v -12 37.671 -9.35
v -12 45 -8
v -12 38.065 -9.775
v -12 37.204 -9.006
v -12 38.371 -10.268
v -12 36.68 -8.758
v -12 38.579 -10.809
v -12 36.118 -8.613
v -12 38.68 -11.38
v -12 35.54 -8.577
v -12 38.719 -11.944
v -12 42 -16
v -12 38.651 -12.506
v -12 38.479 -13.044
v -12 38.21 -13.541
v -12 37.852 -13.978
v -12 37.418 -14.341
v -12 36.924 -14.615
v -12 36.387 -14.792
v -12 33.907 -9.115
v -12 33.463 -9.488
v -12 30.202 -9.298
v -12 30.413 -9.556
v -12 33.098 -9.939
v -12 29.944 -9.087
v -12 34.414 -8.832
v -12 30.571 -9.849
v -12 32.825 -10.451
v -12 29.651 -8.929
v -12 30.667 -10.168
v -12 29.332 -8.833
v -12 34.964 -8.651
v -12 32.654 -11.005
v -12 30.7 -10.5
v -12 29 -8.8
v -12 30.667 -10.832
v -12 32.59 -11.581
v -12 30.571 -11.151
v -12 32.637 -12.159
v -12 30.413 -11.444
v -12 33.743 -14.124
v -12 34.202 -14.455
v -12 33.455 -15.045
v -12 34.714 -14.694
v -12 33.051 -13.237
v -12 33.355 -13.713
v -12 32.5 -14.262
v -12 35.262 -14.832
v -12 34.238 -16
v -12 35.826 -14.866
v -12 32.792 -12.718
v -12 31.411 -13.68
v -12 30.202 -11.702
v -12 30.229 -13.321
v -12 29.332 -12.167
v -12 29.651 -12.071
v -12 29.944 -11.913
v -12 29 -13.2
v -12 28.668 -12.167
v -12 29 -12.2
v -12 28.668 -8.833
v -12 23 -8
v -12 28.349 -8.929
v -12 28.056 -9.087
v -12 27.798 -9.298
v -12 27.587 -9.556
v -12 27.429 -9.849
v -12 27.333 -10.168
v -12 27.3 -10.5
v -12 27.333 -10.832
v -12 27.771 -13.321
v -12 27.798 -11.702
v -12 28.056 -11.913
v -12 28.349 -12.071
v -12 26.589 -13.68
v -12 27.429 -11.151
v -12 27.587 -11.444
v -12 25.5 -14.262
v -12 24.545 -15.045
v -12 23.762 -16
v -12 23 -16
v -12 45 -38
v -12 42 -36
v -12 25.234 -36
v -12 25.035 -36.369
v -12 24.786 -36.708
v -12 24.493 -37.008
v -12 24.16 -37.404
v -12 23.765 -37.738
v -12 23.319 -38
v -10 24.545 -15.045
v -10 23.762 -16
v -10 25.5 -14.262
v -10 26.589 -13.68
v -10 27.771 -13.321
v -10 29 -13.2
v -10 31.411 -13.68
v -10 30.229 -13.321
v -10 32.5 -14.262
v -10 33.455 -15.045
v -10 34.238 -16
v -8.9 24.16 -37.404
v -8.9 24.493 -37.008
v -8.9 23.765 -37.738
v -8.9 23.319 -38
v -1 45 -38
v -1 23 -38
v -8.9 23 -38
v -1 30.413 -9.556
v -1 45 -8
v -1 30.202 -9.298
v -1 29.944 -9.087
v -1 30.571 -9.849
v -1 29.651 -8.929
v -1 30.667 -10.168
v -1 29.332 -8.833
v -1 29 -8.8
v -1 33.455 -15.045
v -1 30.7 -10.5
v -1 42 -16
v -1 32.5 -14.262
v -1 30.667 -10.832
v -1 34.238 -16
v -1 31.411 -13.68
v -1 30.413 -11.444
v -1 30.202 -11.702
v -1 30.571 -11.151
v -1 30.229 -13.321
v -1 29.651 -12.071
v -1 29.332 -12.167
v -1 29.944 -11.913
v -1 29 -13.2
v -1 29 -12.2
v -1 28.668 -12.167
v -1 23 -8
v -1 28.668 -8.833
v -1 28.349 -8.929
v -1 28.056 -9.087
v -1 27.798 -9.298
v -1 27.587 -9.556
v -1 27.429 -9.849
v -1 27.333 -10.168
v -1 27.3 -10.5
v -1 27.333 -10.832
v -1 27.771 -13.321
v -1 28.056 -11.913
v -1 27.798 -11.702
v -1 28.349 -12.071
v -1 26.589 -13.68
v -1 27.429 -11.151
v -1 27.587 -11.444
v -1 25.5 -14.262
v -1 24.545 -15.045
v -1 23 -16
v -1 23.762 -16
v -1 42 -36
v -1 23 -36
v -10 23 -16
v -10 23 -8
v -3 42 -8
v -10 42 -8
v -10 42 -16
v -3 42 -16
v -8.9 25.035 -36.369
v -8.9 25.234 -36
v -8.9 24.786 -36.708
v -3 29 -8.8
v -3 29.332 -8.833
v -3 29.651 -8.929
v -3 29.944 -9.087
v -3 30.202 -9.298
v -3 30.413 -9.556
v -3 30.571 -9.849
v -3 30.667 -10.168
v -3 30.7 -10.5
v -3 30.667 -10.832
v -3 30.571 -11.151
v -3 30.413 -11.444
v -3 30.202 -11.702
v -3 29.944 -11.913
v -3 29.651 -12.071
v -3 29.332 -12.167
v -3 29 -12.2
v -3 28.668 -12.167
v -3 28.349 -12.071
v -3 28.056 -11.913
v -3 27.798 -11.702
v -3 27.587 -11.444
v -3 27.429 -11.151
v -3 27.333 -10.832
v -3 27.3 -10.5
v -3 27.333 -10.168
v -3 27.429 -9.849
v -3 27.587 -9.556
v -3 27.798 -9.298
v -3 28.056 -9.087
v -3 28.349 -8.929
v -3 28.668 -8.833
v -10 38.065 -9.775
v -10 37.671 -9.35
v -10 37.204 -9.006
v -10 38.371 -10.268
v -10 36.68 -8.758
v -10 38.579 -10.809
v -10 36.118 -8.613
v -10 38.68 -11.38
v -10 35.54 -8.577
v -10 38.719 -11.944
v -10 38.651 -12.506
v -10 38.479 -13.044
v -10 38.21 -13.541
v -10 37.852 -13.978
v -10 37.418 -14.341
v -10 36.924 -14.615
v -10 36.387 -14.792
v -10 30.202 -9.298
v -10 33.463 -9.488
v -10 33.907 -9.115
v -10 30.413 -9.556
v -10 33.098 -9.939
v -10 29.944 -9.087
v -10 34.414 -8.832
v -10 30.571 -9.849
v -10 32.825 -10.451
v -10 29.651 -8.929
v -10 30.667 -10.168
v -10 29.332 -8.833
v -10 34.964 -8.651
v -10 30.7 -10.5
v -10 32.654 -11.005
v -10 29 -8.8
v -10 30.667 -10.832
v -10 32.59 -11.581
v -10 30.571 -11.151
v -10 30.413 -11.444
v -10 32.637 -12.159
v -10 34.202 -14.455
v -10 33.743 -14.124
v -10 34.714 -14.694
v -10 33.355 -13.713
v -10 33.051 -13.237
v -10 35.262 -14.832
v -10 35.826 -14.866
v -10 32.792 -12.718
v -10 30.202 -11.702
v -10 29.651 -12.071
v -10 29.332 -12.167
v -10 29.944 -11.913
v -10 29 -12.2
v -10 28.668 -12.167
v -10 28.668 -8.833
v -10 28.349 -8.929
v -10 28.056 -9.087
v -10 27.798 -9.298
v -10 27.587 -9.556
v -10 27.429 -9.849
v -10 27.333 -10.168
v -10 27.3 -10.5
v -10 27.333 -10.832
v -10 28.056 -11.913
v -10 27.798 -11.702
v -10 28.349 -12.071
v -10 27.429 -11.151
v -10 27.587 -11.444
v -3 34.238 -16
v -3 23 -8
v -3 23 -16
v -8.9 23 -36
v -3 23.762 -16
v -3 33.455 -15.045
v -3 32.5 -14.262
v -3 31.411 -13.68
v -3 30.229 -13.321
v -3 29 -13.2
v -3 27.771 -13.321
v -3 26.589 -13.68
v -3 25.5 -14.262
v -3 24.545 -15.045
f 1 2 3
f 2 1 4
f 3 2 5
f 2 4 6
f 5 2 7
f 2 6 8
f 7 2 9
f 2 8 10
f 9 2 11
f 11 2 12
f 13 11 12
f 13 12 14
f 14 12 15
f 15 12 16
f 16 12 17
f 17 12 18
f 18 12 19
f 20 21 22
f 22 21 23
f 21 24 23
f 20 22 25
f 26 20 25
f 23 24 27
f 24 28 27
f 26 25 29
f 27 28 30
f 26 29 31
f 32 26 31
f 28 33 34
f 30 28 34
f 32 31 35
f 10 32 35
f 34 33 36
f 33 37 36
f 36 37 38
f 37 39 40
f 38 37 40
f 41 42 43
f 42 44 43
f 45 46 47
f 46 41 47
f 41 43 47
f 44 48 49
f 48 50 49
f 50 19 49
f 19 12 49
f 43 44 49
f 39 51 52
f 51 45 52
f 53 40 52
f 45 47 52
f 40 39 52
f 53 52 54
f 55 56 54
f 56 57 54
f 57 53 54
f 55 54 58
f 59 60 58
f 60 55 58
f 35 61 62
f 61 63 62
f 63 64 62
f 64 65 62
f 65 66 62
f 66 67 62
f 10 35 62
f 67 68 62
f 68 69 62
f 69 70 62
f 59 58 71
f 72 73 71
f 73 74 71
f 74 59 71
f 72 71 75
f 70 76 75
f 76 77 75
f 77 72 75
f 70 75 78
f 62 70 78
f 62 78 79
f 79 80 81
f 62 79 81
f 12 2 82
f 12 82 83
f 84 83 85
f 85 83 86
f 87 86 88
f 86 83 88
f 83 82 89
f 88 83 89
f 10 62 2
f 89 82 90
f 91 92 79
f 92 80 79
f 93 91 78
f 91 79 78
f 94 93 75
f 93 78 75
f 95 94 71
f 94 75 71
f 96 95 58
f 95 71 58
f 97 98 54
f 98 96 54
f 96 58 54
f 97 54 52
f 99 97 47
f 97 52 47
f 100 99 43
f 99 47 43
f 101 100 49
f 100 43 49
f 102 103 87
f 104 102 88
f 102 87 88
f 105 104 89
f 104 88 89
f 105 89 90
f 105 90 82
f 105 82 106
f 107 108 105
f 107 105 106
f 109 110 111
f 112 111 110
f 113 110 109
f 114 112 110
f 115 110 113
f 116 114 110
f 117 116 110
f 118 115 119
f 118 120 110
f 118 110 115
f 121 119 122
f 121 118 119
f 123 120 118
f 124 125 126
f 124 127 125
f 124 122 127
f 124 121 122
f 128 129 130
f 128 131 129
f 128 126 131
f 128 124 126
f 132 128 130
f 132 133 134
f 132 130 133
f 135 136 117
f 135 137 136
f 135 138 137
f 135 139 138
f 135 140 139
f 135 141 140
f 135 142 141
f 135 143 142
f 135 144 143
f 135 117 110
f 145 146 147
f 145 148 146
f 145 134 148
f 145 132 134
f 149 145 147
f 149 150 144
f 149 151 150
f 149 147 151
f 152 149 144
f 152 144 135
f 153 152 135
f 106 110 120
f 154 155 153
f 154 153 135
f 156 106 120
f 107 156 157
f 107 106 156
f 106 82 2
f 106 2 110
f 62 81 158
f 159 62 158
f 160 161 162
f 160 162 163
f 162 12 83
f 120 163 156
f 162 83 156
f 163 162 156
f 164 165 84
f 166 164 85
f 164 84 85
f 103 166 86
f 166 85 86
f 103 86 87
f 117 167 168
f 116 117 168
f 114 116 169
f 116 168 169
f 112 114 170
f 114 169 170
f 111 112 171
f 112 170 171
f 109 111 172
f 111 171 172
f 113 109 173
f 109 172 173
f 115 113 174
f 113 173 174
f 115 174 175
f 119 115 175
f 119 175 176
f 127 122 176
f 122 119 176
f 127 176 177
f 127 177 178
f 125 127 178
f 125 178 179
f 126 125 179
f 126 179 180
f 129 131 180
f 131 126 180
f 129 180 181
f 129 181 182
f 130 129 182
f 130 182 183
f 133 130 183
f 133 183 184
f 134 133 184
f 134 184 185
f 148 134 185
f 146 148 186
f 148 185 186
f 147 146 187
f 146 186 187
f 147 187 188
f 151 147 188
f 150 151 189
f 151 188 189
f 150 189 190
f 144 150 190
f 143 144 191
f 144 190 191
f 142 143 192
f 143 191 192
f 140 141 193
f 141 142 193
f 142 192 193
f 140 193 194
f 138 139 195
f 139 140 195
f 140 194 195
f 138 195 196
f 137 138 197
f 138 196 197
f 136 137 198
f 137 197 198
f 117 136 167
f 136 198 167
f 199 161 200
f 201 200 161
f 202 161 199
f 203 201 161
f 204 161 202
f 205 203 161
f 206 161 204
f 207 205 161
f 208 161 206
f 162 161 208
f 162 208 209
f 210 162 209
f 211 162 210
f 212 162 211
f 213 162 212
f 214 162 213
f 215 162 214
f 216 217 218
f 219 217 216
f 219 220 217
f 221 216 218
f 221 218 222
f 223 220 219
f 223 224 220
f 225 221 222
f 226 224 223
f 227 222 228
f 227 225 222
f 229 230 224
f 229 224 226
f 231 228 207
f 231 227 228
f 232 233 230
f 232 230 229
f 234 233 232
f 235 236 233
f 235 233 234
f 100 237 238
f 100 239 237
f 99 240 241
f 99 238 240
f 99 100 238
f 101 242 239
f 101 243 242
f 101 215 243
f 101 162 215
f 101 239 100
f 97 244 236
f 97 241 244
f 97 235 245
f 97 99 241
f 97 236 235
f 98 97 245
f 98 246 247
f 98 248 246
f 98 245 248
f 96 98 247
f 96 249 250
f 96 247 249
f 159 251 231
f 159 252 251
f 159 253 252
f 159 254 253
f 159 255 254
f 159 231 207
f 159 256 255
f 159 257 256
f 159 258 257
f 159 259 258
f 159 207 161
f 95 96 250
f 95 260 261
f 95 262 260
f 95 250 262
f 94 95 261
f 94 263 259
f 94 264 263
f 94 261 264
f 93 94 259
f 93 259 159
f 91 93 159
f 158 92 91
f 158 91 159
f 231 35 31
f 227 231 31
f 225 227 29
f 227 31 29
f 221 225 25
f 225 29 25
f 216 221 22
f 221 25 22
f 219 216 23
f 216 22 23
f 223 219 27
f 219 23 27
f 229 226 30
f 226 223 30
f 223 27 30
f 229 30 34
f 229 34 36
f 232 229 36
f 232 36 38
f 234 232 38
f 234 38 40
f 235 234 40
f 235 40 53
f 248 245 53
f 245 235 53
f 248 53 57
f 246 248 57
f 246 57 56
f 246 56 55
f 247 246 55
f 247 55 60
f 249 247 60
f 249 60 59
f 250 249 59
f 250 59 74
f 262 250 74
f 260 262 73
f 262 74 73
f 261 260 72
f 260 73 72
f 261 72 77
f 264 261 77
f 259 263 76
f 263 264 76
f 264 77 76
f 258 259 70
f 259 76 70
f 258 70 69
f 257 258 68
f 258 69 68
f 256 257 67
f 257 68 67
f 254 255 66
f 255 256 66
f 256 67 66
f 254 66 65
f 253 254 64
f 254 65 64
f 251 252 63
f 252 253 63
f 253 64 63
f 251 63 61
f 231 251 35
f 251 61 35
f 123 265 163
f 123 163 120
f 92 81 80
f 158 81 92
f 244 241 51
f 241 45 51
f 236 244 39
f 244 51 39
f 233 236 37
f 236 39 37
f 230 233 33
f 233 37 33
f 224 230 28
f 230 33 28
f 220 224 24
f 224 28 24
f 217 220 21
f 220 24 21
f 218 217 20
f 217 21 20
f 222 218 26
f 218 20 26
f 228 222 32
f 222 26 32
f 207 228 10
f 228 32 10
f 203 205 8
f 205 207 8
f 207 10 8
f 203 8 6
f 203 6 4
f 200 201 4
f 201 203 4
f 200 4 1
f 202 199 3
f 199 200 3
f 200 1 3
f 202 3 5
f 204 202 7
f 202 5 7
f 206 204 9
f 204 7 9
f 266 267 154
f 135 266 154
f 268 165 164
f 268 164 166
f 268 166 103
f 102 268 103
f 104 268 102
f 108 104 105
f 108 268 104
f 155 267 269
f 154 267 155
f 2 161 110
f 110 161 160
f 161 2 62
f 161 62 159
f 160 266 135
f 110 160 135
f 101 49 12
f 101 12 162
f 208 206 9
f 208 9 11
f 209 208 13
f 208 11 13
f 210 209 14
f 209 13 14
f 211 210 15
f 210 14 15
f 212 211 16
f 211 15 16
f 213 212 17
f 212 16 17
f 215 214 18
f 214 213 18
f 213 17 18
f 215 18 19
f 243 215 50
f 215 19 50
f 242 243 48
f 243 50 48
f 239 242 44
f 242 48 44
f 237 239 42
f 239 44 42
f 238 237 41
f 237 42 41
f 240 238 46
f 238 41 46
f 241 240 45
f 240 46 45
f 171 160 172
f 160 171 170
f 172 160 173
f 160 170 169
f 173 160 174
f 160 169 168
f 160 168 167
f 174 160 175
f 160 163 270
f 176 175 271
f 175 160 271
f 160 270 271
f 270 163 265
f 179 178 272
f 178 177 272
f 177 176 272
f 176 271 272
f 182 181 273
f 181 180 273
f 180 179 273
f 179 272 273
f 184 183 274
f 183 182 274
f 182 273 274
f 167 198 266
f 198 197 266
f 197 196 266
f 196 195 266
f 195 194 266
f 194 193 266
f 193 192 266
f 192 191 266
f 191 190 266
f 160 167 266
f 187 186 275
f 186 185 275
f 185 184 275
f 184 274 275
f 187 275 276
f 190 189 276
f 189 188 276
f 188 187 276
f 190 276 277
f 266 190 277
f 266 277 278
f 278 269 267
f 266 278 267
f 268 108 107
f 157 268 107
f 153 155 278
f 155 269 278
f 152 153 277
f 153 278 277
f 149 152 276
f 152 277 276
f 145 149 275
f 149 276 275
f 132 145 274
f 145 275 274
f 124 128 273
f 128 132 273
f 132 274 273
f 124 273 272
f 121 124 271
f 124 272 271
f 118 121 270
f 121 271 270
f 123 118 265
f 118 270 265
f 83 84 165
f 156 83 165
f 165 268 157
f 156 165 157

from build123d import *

# Parameters (mm, degrees)
REAR_LOCK_EAR_SKETCH_W             = 2
REAR_LOCK_EAR_SKETCH_H             = 22
REAR_LOCK_EAR_DEPTH                = 8
LOCK_FORK_WEB_SKETCH_W             = 11
LOCK_FORK_WEB_SKETCH_H             = 3
LOCK_FORK_WEB_DEPTH                = 30
FRONT_LOCK_EAR_SKETCH_W            = 2
FRONT_LOCK_EAR_SKETCH_H            = 22
FRONT_LOCK_EAR_DEPTH               = 8
FORK_MOUNTING_FOOT_SKETCH_W        = 11
FORK_MOUNTING_FOOT_SKETCH_H        = 22
FORK_MOUNTING_FOOT_DEPTH           = 2
COUPLING_BARREL_CLEARANCE_SKETCH_R = 6.3
COUPLING_BARREL_CLEARANCE_DEPTH    = 11.3
SERVICE_PIN_CLEARANCE_1_SKETCH_R   = 1.7
SERVICE_PIN_CLEARANCE_1_DEPTH      = 2.3
SERVICE_PIN_CLEARANCE_2_SKETCH_R   = 1.7
SERVICE_PIN_CLEARANCE_2_DEPTH      = 2.3
MOTOR_HEAD_ACCESS_1_1_SKETCH_R     = 3
MOTOR_HEAD_ACCESS_1_1_DEPTH        = 3.2
MOTOR_HEAD_ACCESS_1_5_SKETCH_R     = 3
MOTOR_HEAD_ACCESS_1_5_DEPTH        = 3.2
MOTOR_HEAD_ACCESS_2_1_SKETCH_R     = 3.05
MOTOR_HEAD_ACCESS_2_1_DEPTH        = 3.2
MOTOR_HEAD_ACCESS_2_5_SKETCH_R     = 3.05
MOTOR_HEAD_ACCESS_2_5_DEPTH        = 3.2


with BuildPart() as part:
    # Rear lock ear sketch → Rear lock ear (new body)
    with BuildSketch(Plane.XY.offset(-16)):
        with Locations((-11, -34)):
            Rectangle(REAR_LOCK_EAR_SKETCH_W, REAR_LOCK_EAR_SKETCH_H)
    extrude(amount=REAR_LOCK_EAR_DEPTH)

    # Lock fork web sketch → Lock fork web (add)
    with BuildSketch(Plane.XY.offset(-38)):
        with Locations((-6.5, -43.5)):
            Rectangle(LOCK_FORK_WEB_SKETCH_W, LOCK_FORK_WEB_SKETCH_H)
    extrude(amount=LOCK_FORK_WEB_DEPTH)

    # Front lock ear sketch → Front lock ear (add)
    with BuildSketch(Plane.XY.offset(-16)):
        with Locations((-2, -34)):
            Rectangle(FRONT_LOCK_EAR_SKETCH_W, FRONT_LOCK_EAR_SKETCH_H)
    extrude(amount=FRONT_LOCK_EAR_DEPTH)

    # Fork mounting foot sketch → Fork mounting foot (add)
    with BuildSketch(Plane.XY.offset(-38)):
        with Locations((-6.5, -34)):
            Rectangle(FORK_MOUNTING_FOOT_SKETCH_W, FORK_MOUNTING_FOOT_SKETCH_H)
    extrude(amount=FORK_MOUNTING_FOOT_DEPTH)

    # Coupling barrel clearance sketch → Coupling barrel clearance (cut)
    with BuildSketch(Plane(origin=(-12.1, 0, 0), x_dir=(0, 0, -1), z_dir=(1, 0, 0))):
        with Locations((19.5, -29)):
            Circle(COUPLING_BARREL_CLEARANCE_SKETCH_R)
    extrude(amount=COUPLING_BARREL_CLEARANCE_DEPTH, mode=Mode.SUBTRACT)

    # Service pin clearance 1 sketch → Service pin clearance 1 (cut)
    with BuildSketch(Plane(origin=(-12.1, 0, 0), x_dir=(0, 0, -1), z_dir=(1, 0, 0))):
        with Locations(Location((10.5, -29, 0), (0, 0, 180))):
            Circle(SERVICE_PIN_CLEARANCE_1_SKETCH_R)
    extrude(amount=SERVICE_PIN_CLEARANCE_1_DEPTH, mode=Mode.SUBTRACT)

    # Service pin clearance 2 sketch → Service pin clearance 2 (cut)
    with BuildSketch(Plane(origin=(-3.1, 0, 0), x_dir=(0, 0, -1), z_dir=(1, 0, 0))):
        with Locations(Location((10.5, -29, 0), (0, 0, 180))):
            Circle(SERVICE_PIN_CLEARANCE_2_SKETCH_R)
    extrude(amount=SERVICE_PIN_CLEARANCE_2_DEPTH, mode=Mode.SUBTRACT)

    # Motor head access 1-1 sketch → Motor head access 1-1 (cut)
    with BuildSketch(Plane(origin=(-12.1, 0, 0), x_dir=(0, 0, -1), z_dir=(1, 0, 0))):
        with Locations((34.765, -22.5)):
            Circle(MOTOR_HEAD_ACCESS_1_1_SKETCH_R)
    extrude(amount=MOTOR_HEAD_ACCESS_1_1_DEPTH, mode=Mode.SUBTRACT)

    # Motor head access 1-5 sketch → Motor head access 1-5 (cut)
    with BuildSketch(Plane(origin=(-12.1, 0, 0), x_dir=(0, 0, -1), z_dir=(1, 0, 0))):
        with Locations(Location((11.8675, -35.719877789, 0), (0, 0, 180))):
            Circle(MOTOR_HEAD_ACCESS_1_5_SKETCH_R)
    extrude(amount=MOTOR_HEAD_ACCESS_1_5_DEPTH, mode=Mode.SUBTRACT)

    # Motor head access 2-1 sketch → Motor head access 2-1 (cut)
    with BuildSketch(Plane(origin=(-12.1, 0, 0), x_dir=(0, 0, -1), z_dir=(1, 0, 0))):
        with Locations((35.25, -22)):
            Circle(MOTOR_HEAD_ACCESS_2_1_SKETCH_R)
    extrude(amount=MOTOR_HEAD_ACCESS_2_1_DEPTH, mode=Mode.SUBTRACT)

    # Motor head access 2-5 sketch → Motor head access 2-5 (cut)
    with BuildSketch(Plane(origin=(-12.1, 0, 0), x_dir=(0, 0, -1), z_dir=(1, 0, 0))):
        with Locations((11.625, -35.63990011)):
            Circle(MOTOR_HEAD_ACCESS_2_5_SKETCH_R)
    extrude(amount=MOTOR_HEAD_ACCESS_2_5_DEPTH, mode=Mode.SUBTRACT)


with BuildPart() as body_2:
    # Mirror1: mirrored copy
    add(part.part.mirror(Plane(origin=(0, 0, 0), x_dir=(0, 0, 1), z_dir=(0, -1, 0))))


solid = body_2.part
